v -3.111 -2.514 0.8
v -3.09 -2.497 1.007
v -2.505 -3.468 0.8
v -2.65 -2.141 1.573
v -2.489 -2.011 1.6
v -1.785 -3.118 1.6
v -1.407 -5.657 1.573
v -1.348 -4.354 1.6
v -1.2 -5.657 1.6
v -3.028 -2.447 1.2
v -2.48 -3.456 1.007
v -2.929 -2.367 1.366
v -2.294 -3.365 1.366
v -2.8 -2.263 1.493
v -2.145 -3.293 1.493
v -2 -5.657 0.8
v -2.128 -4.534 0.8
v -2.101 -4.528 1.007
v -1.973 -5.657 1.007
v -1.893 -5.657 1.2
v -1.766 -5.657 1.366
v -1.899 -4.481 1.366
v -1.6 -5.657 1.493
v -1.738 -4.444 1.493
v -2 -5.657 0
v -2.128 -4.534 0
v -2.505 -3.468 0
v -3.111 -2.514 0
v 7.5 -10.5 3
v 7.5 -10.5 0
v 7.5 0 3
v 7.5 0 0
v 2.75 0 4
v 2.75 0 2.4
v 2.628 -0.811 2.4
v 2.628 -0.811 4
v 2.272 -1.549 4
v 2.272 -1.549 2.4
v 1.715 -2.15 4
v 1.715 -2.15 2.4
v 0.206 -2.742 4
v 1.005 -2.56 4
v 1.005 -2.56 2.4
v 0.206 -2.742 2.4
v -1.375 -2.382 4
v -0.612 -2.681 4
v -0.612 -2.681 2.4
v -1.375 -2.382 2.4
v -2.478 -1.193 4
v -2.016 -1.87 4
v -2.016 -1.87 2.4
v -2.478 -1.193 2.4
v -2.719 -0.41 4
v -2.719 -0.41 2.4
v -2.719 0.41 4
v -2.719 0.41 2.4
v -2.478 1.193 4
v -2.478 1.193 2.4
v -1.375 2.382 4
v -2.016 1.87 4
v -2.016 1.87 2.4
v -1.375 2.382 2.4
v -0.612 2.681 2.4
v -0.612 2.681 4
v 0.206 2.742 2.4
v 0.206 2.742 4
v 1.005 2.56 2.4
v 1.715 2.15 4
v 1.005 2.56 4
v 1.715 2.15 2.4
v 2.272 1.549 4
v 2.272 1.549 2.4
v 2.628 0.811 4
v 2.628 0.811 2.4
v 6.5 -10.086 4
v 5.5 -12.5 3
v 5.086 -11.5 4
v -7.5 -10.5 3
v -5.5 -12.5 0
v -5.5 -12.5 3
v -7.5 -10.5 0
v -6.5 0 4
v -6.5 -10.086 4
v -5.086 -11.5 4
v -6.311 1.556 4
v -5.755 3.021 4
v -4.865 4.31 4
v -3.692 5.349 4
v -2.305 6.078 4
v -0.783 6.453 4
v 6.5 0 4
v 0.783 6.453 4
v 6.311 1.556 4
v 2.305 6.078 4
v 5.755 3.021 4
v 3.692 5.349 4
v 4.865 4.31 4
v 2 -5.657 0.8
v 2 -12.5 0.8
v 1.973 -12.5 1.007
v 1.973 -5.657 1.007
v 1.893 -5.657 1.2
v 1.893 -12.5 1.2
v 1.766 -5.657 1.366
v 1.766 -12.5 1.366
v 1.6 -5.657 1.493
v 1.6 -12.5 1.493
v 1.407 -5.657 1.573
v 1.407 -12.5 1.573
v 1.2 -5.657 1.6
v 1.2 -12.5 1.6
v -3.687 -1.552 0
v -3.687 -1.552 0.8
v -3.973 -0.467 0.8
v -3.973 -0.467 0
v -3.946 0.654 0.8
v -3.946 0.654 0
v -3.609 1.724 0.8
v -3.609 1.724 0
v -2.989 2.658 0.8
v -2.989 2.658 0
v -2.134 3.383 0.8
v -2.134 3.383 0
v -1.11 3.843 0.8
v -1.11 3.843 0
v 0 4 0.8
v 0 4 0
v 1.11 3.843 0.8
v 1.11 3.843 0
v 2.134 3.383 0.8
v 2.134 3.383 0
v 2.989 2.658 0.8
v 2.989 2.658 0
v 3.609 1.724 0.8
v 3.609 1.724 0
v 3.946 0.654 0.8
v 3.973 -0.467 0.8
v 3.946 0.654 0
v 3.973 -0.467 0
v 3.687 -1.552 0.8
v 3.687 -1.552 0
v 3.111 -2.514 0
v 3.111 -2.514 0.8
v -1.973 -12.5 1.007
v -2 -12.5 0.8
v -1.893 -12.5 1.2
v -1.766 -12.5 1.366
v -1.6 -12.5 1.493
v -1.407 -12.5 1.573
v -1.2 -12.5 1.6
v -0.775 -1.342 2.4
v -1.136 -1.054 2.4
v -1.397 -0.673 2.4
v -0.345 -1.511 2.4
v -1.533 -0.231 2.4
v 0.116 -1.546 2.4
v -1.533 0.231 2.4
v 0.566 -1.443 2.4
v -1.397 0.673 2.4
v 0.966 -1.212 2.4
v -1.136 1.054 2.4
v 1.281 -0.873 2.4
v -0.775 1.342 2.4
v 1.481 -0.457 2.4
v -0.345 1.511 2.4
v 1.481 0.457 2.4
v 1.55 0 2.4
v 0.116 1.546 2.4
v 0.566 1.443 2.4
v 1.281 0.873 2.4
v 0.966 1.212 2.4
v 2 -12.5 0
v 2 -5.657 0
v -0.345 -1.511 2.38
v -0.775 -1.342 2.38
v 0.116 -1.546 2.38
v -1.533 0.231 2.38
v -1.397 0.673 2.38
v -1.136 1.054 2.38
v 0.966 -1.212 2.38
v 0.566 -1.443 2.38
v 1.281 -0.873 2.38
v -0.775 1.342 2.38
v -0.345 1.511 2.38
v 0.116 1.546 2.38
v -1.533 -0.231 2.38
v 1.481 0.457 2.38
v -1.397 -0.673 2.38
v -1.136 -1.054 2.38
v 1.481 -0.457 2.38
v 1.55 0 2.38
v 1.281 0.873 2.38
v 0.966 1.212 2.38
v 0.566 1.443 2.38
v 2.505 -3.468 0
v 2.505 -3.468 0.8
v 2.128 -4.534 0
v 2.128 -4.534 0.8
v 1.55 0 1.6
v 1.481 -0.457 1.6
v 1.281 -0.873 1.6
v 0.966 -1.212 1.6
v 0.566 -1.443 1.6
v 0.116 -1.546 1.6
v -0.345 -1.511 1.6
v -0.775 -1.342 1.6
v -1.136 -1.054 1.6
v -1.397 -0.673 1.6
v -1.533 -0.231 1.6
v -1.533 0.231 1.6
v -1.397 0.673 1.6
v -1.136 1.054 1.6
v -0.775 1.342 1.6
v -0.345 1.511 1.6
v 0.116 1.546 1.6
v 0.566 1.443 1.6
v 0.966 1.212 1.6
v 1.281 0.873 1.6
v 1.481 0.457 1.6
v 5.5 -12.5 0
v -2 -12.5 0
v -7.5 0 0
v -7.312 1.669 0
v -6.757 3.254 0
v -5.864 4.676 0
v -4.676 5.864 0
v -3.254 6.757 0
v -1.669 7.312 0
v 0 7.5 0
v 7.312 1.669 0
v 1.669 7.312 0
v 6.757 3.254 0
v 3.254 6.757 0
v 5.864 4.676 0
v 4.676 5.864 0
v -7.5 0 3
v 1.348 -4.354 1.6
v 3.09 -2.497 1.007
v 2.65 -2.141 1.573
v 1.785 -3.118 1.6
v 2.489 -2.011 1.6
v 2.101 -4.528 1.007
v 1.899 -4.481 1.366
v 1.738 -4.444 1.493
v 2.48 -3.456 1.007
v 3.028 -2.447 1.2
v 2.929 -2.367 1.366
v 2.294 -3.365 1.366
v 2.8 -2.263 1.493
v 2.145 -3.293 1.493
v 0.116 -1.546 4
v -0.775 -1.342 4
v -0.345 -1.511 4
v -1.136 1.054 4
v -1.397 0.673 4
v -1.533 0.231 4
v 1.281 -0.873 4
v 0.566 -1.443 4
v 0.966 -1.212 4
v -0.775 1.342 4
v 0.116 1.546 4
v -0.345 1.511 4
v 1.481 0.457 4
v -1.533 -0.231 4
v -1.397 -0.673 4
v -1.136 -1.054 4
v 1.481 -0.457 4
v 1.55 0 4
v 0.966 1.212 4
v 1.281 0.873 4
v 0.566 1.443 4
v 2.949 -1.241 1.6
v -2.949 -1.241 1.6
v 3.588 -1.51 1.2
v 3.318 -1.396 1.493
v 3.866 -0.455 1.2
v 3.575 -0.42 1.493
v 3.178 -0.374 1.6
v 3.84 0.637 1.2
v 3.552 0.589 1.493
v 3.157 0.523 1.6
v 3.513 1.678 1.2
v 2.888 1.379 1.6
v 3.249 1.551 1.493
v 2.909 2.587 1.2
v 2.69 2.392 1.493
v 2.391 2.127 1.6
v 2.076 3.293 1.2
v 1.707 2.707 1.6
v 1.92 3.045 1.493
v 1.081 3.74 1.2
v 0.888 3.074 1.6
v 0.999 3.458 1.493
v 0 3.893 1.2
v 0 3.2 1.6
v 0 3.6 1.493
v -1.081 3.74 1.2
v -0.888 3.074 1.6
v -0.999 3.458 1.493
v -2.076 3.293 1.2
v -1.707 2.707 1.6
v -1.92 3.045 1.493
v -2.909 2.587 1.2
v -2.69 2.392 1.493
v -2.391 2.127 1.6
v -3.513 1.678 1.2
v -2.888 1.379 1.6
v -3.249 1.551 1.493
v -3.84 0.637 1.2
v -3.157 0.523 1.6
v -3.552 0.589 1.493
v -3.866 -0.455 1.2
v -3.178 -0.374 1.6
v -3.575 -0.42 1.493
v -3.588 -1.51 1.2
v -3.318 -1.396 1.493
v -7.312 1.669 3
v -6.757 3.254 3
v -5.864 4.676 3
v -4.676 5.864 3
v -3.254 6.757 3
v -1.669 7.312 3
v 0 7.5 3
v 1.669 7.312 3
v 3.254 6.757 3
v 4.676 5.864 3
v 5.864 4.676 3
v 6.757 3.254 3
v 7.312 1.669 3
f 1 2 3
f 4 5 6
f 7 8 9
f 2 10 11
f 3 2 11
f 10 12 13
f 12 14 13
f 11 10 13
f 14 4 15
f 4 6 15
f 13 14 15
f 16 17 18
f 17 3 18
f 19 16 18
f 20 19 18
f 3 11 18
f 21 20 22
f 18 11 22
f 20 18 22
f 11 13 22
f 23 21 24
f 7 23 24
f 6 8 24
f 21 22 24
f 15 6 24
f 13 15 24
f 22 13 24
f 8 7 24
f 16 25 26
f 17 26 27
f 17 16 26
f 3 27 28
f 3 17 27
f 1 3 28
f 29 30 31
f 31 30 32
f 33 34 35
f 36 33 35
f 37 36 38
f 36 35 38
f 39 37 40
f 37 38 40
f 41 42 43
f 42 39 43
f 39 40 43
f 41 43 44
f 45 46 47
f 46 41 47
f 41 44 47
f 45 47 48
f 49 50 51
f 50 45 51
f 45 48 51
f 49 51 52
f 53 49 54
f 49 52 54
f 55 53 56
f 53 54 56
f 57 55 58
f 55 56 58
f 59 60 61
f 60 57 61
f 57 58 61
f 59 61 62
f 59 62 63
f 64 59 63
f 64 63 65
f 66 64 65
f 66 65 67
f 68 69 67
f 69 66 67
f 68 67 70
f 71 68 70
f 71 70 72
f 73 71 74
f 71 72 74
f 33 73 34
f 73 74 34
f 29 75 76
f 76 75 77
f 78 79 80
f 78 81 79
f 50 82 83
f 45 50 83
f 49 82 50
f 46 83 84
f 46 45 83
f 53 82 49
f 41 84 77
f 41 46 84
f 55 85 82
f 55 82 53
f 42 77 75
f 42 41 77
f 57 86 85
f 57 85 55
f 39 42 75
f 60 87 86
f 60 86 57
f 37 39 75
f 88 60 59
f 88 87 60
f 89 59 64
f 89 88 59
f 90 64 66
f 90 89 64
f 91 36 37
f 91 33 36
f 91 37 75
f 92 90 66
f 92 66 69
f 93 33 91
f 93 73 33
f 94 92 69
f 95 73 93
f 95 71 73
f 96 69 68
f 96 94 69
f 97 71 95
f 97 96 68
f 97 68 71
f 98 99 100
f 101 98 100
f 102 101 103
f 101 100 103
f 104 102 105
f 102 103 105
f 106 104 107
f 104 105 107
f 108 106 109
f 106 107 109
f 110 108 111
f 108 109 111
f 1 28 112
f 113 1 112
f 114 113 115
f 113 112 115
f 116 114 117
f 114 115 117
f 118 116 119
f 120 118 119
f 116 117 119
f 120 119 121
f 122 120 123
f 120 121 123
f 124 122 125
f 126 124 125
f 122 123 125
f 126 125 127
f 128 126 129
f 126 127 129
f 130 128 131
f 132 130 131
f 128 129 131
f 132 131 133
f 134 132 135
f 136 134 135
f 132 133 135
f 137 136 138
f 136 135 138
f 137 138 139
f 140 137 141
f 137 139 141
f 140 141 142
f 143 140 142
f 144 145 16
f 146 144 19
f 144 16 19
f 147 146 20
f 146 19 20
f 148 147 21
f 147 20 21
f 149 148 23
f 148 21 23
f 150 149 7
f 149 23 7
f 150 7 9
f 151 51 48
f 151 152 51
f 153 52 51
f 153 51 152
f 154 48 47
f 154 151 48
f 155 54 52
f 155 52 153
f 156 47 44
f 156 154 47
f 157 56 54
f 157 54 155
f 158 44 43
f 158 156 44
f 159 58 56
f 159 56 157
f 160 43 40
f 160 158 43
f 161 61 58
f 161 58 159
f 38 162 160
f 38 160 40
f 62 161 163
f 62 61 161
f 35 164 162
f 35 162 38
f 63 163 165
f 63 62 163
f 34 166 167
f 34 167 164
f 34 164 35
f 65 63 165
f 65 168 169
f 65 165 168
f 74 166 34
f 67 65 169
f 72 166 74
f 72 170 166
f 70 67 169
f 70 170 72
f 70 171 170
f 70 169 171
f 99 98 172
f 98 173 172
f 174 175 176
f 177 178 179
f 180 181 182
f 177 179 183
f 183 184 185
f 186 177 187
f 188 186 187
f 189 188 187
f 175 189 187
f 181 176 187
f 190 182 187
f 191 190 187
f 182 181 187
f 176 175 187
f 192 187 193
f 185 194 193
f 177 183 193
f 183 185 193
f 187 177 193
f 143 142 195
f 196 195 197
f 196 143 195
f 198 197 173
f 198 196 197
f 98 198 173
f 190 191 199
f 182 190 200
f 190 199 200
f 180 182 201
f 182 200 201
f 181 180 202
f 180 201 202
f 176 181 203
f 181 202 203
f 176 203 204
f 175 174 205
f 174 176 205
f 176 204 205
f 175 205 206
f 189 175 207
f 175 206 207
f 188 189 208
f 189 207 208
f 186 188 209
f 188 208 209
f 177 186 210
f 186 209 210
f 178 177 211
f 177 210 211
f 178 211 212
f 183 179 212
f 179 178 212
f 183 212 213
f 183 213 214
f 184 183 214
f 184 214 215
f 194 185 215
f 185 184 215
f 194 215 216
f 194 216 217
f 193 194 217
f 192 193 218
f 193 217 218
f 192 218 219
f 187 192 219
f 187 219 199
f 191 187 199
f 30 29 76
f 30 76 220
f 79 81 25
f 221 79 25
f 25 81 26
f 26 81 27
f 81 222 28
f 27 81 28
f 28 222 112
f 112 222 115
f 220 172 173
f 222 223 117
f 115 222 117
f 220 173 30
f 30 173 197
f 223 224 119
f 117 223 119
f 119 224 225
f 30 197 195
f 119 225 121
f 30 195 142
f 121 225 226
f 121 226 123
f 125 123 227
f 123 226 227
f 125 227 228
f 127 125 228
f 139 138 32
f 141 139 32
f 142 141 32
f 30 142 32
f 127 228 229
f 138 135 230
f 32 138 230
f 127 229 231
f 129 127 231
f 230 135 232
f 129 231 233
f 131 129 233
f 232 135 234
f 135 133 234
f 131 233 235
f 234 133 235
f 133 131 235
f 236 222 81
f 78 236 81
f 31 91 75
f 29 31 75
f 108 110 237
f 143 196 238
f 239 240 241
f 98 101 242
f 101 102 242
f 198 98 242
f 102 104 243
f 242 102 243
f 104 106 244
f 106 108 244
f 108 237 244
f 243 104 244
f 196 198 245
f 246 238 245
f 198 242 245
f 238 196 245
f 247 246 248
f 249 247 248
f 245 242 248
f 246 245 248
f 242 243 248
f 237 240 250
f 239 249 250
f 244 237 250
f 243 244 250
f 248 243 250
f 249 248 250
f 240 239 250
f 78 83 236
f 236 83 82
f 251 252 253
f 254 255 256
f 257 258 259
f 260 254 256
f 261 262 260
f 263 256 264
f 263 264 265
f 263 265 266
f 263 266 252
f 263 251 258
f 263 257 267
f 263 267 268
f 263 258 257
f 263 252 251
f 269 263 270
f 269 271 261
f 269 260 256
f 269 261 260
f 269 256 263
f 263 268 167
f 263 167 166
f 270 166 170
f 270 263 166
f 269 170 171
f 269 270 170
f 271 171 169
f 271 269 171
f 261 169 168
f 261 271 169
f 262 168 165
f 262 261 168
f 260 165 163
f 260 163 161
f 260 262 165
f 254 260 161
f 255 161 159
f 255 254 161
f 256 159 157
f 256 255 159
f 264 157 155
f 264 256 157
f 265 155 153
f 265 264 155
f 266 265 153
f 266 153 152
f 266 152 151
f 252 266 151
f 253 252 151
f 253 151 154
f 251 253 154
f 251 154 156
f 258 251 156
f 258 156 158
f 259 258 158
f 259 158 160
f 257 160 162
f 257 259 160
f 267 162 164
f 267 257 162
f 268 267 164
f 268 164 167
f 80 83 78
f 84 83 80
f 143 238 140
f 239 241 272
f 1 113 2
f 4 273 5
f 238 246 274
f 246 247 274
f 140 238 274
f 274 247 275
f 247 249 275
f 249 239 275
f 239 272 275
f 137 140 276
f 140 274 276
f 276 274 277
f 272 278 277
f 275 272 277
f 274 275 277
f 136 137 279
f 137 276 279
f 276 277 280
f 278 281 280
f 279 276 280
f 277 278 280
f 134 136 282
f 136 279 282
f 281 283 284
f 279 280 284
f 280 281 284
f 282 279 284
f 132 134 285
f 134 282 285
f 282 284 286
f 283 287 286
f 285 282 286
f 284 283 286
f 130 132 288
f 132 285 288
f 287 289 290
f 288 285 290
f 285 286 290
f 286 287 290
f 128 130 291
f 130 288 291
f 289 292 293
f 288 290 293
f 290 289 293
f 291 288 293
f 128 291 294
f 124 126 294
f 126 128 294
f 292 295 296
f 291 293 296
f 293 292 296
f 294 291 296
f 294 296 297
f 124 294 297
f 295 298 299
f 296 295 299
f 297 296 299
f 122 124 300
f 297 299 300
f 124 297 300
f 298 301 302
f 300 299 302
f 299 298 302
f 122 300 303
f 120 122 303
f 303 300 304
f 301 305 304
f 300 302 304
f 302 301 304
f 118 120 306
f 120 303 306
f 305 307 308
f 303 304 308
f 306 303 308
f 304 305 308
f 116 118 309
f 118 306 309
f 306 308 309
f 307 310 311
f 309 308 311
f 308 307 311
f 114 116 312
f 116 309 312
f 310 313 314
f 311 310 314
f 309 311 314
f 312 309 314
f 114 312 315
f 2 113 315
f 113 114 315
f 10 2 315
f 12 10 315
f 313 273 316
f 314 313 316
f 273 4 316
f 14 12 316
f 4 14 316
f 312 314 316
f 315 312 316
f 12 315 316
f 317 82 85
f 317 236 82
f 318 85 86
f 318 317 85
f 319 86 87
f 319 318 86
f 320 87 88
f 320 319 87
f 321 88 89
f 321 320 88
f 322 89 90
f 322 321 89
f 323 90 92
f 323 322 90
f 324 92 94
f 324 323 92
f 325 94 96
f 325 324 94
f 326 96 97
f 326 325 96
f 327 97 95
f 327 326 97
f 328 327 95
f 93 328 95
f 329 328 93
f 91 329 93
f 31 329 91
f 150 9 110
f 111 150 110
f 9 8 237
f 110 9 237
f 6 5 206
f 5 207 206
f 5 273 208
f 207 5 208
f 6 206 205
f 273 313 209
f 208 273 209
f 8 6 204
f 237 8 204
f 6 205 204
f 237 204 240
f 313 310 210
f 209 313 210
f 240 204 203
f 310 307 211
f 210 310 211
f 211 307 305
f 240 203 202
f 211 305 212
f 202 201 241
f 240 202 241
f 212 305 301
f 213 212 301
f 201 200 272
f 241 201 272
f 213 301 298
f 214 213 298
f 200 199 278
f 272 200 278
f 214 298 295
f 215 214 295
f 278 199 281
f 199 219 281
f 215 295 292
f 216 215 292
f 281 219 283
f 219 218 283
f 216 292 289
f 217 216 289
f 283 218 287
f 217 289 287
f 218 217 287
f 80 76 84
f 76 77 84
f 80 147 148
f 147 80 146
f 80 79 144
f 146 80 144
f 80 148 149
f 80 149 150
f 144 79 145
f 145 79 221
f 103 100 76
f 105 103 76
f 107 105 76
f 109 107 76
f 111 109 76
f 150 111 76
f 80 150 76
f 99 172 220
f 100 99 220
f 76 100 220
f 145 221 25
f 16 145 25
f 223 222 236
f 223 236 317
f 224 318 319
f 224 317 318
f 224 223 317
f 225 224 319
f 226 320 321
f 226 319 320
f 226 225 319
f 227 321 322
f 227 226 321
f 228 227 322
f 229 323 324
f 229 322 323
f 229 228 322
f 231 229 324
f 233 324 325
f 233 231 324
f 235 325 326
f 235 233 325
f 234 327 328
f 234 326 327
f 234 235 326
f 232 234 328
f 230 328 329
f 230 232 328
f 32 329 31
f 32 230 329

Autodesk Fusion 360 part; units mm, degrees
sketch "Sketch1" plane through (0, 0, 0) normal (0, 0, 1) x (1, 0, 0)
  circle A0 centre (0, 0) radius 7.5
  line L0 (-7.5, 0) -> (-7.5, -12.5)
  line L1 (-7.5, -12.5) -> (7.5, -12.5)
  line L2 (7.5, -12.5) -> (7.5, 0)
  circle A1 centre (0, 0) radius 4
  line L3 (-2, -12.5) -> (-2, -3.4641)
  line L4 (2, -3.4641) -> (2, -12.5)
  circle A2 centre (0, 0) radius 1.55
  circle A3 centre (0, 0) radius 2.75
  dimension "d1" = 15
  dimension "d2" = 20
  dimension "d3" = 8
  dimension "d4" = 4
  dimension "d5" = 3.1
  dimension "d6" = 5.5
extrude "Extrude1" add sketch "Sketch1" along normal blind 4 contours A0 A1 L3 L4 | A0 L1 L2 L4 | A0 L0 L1 L3 | A0 L1 L3 L4 | A0 A1 L3 L4 | A1 | A2 | A3
extrude "Extrude2" cut sketch "Sketch1" along normal blind 1.6 contours A0 L1 L3 L4 | A0 A1 L3 L4 | A1 | A2 | A3 picked at (0.436, -6.3069)
extrude "Extrude3" cut sketch "Sketch1" along normal through all contours A2
extrude "Extrude4" cut sketch "Sketch1" along normal up to surface (1.6 mm away) from surface at 2.4 contours A3
fillet "Fillet2" radius 5 2 edges at (2, -3.4641, 0.8) (-2, -3.4641, 0.8)
fillet "Fillet1" radius 0.8 5 edges at (2, -9.0784, 1.6) (2.286, -3.9902, 1.6) (0, 4, 1.6) (-2.286, -3.9902, 1.6) (-2, -9.0784, 1.6)
chamfer "Chamfer1" distance 2 angle 45 2 edges at (-7.5, -12.5, 2) (7.5, -12.5, 2)
chamfer "Chamfer2" distance 1 angle 45 6 edges at (-7.5, -5.25, 4) (7.5, -5.25, 4) (0, 7.5, 4) (0, -12.5, 4) (6.5, -11.5, 4) (-6.5, -11.5, 4)
cylinder "CylinderPrimitive1" add diameter 3.1 height -1.62 placed x (1, 0, 0) y (0, 1, 0) z (0, 0, 1) at (0, 0, 4)
equation "d12 = 4 mm - 1.6 mm"
